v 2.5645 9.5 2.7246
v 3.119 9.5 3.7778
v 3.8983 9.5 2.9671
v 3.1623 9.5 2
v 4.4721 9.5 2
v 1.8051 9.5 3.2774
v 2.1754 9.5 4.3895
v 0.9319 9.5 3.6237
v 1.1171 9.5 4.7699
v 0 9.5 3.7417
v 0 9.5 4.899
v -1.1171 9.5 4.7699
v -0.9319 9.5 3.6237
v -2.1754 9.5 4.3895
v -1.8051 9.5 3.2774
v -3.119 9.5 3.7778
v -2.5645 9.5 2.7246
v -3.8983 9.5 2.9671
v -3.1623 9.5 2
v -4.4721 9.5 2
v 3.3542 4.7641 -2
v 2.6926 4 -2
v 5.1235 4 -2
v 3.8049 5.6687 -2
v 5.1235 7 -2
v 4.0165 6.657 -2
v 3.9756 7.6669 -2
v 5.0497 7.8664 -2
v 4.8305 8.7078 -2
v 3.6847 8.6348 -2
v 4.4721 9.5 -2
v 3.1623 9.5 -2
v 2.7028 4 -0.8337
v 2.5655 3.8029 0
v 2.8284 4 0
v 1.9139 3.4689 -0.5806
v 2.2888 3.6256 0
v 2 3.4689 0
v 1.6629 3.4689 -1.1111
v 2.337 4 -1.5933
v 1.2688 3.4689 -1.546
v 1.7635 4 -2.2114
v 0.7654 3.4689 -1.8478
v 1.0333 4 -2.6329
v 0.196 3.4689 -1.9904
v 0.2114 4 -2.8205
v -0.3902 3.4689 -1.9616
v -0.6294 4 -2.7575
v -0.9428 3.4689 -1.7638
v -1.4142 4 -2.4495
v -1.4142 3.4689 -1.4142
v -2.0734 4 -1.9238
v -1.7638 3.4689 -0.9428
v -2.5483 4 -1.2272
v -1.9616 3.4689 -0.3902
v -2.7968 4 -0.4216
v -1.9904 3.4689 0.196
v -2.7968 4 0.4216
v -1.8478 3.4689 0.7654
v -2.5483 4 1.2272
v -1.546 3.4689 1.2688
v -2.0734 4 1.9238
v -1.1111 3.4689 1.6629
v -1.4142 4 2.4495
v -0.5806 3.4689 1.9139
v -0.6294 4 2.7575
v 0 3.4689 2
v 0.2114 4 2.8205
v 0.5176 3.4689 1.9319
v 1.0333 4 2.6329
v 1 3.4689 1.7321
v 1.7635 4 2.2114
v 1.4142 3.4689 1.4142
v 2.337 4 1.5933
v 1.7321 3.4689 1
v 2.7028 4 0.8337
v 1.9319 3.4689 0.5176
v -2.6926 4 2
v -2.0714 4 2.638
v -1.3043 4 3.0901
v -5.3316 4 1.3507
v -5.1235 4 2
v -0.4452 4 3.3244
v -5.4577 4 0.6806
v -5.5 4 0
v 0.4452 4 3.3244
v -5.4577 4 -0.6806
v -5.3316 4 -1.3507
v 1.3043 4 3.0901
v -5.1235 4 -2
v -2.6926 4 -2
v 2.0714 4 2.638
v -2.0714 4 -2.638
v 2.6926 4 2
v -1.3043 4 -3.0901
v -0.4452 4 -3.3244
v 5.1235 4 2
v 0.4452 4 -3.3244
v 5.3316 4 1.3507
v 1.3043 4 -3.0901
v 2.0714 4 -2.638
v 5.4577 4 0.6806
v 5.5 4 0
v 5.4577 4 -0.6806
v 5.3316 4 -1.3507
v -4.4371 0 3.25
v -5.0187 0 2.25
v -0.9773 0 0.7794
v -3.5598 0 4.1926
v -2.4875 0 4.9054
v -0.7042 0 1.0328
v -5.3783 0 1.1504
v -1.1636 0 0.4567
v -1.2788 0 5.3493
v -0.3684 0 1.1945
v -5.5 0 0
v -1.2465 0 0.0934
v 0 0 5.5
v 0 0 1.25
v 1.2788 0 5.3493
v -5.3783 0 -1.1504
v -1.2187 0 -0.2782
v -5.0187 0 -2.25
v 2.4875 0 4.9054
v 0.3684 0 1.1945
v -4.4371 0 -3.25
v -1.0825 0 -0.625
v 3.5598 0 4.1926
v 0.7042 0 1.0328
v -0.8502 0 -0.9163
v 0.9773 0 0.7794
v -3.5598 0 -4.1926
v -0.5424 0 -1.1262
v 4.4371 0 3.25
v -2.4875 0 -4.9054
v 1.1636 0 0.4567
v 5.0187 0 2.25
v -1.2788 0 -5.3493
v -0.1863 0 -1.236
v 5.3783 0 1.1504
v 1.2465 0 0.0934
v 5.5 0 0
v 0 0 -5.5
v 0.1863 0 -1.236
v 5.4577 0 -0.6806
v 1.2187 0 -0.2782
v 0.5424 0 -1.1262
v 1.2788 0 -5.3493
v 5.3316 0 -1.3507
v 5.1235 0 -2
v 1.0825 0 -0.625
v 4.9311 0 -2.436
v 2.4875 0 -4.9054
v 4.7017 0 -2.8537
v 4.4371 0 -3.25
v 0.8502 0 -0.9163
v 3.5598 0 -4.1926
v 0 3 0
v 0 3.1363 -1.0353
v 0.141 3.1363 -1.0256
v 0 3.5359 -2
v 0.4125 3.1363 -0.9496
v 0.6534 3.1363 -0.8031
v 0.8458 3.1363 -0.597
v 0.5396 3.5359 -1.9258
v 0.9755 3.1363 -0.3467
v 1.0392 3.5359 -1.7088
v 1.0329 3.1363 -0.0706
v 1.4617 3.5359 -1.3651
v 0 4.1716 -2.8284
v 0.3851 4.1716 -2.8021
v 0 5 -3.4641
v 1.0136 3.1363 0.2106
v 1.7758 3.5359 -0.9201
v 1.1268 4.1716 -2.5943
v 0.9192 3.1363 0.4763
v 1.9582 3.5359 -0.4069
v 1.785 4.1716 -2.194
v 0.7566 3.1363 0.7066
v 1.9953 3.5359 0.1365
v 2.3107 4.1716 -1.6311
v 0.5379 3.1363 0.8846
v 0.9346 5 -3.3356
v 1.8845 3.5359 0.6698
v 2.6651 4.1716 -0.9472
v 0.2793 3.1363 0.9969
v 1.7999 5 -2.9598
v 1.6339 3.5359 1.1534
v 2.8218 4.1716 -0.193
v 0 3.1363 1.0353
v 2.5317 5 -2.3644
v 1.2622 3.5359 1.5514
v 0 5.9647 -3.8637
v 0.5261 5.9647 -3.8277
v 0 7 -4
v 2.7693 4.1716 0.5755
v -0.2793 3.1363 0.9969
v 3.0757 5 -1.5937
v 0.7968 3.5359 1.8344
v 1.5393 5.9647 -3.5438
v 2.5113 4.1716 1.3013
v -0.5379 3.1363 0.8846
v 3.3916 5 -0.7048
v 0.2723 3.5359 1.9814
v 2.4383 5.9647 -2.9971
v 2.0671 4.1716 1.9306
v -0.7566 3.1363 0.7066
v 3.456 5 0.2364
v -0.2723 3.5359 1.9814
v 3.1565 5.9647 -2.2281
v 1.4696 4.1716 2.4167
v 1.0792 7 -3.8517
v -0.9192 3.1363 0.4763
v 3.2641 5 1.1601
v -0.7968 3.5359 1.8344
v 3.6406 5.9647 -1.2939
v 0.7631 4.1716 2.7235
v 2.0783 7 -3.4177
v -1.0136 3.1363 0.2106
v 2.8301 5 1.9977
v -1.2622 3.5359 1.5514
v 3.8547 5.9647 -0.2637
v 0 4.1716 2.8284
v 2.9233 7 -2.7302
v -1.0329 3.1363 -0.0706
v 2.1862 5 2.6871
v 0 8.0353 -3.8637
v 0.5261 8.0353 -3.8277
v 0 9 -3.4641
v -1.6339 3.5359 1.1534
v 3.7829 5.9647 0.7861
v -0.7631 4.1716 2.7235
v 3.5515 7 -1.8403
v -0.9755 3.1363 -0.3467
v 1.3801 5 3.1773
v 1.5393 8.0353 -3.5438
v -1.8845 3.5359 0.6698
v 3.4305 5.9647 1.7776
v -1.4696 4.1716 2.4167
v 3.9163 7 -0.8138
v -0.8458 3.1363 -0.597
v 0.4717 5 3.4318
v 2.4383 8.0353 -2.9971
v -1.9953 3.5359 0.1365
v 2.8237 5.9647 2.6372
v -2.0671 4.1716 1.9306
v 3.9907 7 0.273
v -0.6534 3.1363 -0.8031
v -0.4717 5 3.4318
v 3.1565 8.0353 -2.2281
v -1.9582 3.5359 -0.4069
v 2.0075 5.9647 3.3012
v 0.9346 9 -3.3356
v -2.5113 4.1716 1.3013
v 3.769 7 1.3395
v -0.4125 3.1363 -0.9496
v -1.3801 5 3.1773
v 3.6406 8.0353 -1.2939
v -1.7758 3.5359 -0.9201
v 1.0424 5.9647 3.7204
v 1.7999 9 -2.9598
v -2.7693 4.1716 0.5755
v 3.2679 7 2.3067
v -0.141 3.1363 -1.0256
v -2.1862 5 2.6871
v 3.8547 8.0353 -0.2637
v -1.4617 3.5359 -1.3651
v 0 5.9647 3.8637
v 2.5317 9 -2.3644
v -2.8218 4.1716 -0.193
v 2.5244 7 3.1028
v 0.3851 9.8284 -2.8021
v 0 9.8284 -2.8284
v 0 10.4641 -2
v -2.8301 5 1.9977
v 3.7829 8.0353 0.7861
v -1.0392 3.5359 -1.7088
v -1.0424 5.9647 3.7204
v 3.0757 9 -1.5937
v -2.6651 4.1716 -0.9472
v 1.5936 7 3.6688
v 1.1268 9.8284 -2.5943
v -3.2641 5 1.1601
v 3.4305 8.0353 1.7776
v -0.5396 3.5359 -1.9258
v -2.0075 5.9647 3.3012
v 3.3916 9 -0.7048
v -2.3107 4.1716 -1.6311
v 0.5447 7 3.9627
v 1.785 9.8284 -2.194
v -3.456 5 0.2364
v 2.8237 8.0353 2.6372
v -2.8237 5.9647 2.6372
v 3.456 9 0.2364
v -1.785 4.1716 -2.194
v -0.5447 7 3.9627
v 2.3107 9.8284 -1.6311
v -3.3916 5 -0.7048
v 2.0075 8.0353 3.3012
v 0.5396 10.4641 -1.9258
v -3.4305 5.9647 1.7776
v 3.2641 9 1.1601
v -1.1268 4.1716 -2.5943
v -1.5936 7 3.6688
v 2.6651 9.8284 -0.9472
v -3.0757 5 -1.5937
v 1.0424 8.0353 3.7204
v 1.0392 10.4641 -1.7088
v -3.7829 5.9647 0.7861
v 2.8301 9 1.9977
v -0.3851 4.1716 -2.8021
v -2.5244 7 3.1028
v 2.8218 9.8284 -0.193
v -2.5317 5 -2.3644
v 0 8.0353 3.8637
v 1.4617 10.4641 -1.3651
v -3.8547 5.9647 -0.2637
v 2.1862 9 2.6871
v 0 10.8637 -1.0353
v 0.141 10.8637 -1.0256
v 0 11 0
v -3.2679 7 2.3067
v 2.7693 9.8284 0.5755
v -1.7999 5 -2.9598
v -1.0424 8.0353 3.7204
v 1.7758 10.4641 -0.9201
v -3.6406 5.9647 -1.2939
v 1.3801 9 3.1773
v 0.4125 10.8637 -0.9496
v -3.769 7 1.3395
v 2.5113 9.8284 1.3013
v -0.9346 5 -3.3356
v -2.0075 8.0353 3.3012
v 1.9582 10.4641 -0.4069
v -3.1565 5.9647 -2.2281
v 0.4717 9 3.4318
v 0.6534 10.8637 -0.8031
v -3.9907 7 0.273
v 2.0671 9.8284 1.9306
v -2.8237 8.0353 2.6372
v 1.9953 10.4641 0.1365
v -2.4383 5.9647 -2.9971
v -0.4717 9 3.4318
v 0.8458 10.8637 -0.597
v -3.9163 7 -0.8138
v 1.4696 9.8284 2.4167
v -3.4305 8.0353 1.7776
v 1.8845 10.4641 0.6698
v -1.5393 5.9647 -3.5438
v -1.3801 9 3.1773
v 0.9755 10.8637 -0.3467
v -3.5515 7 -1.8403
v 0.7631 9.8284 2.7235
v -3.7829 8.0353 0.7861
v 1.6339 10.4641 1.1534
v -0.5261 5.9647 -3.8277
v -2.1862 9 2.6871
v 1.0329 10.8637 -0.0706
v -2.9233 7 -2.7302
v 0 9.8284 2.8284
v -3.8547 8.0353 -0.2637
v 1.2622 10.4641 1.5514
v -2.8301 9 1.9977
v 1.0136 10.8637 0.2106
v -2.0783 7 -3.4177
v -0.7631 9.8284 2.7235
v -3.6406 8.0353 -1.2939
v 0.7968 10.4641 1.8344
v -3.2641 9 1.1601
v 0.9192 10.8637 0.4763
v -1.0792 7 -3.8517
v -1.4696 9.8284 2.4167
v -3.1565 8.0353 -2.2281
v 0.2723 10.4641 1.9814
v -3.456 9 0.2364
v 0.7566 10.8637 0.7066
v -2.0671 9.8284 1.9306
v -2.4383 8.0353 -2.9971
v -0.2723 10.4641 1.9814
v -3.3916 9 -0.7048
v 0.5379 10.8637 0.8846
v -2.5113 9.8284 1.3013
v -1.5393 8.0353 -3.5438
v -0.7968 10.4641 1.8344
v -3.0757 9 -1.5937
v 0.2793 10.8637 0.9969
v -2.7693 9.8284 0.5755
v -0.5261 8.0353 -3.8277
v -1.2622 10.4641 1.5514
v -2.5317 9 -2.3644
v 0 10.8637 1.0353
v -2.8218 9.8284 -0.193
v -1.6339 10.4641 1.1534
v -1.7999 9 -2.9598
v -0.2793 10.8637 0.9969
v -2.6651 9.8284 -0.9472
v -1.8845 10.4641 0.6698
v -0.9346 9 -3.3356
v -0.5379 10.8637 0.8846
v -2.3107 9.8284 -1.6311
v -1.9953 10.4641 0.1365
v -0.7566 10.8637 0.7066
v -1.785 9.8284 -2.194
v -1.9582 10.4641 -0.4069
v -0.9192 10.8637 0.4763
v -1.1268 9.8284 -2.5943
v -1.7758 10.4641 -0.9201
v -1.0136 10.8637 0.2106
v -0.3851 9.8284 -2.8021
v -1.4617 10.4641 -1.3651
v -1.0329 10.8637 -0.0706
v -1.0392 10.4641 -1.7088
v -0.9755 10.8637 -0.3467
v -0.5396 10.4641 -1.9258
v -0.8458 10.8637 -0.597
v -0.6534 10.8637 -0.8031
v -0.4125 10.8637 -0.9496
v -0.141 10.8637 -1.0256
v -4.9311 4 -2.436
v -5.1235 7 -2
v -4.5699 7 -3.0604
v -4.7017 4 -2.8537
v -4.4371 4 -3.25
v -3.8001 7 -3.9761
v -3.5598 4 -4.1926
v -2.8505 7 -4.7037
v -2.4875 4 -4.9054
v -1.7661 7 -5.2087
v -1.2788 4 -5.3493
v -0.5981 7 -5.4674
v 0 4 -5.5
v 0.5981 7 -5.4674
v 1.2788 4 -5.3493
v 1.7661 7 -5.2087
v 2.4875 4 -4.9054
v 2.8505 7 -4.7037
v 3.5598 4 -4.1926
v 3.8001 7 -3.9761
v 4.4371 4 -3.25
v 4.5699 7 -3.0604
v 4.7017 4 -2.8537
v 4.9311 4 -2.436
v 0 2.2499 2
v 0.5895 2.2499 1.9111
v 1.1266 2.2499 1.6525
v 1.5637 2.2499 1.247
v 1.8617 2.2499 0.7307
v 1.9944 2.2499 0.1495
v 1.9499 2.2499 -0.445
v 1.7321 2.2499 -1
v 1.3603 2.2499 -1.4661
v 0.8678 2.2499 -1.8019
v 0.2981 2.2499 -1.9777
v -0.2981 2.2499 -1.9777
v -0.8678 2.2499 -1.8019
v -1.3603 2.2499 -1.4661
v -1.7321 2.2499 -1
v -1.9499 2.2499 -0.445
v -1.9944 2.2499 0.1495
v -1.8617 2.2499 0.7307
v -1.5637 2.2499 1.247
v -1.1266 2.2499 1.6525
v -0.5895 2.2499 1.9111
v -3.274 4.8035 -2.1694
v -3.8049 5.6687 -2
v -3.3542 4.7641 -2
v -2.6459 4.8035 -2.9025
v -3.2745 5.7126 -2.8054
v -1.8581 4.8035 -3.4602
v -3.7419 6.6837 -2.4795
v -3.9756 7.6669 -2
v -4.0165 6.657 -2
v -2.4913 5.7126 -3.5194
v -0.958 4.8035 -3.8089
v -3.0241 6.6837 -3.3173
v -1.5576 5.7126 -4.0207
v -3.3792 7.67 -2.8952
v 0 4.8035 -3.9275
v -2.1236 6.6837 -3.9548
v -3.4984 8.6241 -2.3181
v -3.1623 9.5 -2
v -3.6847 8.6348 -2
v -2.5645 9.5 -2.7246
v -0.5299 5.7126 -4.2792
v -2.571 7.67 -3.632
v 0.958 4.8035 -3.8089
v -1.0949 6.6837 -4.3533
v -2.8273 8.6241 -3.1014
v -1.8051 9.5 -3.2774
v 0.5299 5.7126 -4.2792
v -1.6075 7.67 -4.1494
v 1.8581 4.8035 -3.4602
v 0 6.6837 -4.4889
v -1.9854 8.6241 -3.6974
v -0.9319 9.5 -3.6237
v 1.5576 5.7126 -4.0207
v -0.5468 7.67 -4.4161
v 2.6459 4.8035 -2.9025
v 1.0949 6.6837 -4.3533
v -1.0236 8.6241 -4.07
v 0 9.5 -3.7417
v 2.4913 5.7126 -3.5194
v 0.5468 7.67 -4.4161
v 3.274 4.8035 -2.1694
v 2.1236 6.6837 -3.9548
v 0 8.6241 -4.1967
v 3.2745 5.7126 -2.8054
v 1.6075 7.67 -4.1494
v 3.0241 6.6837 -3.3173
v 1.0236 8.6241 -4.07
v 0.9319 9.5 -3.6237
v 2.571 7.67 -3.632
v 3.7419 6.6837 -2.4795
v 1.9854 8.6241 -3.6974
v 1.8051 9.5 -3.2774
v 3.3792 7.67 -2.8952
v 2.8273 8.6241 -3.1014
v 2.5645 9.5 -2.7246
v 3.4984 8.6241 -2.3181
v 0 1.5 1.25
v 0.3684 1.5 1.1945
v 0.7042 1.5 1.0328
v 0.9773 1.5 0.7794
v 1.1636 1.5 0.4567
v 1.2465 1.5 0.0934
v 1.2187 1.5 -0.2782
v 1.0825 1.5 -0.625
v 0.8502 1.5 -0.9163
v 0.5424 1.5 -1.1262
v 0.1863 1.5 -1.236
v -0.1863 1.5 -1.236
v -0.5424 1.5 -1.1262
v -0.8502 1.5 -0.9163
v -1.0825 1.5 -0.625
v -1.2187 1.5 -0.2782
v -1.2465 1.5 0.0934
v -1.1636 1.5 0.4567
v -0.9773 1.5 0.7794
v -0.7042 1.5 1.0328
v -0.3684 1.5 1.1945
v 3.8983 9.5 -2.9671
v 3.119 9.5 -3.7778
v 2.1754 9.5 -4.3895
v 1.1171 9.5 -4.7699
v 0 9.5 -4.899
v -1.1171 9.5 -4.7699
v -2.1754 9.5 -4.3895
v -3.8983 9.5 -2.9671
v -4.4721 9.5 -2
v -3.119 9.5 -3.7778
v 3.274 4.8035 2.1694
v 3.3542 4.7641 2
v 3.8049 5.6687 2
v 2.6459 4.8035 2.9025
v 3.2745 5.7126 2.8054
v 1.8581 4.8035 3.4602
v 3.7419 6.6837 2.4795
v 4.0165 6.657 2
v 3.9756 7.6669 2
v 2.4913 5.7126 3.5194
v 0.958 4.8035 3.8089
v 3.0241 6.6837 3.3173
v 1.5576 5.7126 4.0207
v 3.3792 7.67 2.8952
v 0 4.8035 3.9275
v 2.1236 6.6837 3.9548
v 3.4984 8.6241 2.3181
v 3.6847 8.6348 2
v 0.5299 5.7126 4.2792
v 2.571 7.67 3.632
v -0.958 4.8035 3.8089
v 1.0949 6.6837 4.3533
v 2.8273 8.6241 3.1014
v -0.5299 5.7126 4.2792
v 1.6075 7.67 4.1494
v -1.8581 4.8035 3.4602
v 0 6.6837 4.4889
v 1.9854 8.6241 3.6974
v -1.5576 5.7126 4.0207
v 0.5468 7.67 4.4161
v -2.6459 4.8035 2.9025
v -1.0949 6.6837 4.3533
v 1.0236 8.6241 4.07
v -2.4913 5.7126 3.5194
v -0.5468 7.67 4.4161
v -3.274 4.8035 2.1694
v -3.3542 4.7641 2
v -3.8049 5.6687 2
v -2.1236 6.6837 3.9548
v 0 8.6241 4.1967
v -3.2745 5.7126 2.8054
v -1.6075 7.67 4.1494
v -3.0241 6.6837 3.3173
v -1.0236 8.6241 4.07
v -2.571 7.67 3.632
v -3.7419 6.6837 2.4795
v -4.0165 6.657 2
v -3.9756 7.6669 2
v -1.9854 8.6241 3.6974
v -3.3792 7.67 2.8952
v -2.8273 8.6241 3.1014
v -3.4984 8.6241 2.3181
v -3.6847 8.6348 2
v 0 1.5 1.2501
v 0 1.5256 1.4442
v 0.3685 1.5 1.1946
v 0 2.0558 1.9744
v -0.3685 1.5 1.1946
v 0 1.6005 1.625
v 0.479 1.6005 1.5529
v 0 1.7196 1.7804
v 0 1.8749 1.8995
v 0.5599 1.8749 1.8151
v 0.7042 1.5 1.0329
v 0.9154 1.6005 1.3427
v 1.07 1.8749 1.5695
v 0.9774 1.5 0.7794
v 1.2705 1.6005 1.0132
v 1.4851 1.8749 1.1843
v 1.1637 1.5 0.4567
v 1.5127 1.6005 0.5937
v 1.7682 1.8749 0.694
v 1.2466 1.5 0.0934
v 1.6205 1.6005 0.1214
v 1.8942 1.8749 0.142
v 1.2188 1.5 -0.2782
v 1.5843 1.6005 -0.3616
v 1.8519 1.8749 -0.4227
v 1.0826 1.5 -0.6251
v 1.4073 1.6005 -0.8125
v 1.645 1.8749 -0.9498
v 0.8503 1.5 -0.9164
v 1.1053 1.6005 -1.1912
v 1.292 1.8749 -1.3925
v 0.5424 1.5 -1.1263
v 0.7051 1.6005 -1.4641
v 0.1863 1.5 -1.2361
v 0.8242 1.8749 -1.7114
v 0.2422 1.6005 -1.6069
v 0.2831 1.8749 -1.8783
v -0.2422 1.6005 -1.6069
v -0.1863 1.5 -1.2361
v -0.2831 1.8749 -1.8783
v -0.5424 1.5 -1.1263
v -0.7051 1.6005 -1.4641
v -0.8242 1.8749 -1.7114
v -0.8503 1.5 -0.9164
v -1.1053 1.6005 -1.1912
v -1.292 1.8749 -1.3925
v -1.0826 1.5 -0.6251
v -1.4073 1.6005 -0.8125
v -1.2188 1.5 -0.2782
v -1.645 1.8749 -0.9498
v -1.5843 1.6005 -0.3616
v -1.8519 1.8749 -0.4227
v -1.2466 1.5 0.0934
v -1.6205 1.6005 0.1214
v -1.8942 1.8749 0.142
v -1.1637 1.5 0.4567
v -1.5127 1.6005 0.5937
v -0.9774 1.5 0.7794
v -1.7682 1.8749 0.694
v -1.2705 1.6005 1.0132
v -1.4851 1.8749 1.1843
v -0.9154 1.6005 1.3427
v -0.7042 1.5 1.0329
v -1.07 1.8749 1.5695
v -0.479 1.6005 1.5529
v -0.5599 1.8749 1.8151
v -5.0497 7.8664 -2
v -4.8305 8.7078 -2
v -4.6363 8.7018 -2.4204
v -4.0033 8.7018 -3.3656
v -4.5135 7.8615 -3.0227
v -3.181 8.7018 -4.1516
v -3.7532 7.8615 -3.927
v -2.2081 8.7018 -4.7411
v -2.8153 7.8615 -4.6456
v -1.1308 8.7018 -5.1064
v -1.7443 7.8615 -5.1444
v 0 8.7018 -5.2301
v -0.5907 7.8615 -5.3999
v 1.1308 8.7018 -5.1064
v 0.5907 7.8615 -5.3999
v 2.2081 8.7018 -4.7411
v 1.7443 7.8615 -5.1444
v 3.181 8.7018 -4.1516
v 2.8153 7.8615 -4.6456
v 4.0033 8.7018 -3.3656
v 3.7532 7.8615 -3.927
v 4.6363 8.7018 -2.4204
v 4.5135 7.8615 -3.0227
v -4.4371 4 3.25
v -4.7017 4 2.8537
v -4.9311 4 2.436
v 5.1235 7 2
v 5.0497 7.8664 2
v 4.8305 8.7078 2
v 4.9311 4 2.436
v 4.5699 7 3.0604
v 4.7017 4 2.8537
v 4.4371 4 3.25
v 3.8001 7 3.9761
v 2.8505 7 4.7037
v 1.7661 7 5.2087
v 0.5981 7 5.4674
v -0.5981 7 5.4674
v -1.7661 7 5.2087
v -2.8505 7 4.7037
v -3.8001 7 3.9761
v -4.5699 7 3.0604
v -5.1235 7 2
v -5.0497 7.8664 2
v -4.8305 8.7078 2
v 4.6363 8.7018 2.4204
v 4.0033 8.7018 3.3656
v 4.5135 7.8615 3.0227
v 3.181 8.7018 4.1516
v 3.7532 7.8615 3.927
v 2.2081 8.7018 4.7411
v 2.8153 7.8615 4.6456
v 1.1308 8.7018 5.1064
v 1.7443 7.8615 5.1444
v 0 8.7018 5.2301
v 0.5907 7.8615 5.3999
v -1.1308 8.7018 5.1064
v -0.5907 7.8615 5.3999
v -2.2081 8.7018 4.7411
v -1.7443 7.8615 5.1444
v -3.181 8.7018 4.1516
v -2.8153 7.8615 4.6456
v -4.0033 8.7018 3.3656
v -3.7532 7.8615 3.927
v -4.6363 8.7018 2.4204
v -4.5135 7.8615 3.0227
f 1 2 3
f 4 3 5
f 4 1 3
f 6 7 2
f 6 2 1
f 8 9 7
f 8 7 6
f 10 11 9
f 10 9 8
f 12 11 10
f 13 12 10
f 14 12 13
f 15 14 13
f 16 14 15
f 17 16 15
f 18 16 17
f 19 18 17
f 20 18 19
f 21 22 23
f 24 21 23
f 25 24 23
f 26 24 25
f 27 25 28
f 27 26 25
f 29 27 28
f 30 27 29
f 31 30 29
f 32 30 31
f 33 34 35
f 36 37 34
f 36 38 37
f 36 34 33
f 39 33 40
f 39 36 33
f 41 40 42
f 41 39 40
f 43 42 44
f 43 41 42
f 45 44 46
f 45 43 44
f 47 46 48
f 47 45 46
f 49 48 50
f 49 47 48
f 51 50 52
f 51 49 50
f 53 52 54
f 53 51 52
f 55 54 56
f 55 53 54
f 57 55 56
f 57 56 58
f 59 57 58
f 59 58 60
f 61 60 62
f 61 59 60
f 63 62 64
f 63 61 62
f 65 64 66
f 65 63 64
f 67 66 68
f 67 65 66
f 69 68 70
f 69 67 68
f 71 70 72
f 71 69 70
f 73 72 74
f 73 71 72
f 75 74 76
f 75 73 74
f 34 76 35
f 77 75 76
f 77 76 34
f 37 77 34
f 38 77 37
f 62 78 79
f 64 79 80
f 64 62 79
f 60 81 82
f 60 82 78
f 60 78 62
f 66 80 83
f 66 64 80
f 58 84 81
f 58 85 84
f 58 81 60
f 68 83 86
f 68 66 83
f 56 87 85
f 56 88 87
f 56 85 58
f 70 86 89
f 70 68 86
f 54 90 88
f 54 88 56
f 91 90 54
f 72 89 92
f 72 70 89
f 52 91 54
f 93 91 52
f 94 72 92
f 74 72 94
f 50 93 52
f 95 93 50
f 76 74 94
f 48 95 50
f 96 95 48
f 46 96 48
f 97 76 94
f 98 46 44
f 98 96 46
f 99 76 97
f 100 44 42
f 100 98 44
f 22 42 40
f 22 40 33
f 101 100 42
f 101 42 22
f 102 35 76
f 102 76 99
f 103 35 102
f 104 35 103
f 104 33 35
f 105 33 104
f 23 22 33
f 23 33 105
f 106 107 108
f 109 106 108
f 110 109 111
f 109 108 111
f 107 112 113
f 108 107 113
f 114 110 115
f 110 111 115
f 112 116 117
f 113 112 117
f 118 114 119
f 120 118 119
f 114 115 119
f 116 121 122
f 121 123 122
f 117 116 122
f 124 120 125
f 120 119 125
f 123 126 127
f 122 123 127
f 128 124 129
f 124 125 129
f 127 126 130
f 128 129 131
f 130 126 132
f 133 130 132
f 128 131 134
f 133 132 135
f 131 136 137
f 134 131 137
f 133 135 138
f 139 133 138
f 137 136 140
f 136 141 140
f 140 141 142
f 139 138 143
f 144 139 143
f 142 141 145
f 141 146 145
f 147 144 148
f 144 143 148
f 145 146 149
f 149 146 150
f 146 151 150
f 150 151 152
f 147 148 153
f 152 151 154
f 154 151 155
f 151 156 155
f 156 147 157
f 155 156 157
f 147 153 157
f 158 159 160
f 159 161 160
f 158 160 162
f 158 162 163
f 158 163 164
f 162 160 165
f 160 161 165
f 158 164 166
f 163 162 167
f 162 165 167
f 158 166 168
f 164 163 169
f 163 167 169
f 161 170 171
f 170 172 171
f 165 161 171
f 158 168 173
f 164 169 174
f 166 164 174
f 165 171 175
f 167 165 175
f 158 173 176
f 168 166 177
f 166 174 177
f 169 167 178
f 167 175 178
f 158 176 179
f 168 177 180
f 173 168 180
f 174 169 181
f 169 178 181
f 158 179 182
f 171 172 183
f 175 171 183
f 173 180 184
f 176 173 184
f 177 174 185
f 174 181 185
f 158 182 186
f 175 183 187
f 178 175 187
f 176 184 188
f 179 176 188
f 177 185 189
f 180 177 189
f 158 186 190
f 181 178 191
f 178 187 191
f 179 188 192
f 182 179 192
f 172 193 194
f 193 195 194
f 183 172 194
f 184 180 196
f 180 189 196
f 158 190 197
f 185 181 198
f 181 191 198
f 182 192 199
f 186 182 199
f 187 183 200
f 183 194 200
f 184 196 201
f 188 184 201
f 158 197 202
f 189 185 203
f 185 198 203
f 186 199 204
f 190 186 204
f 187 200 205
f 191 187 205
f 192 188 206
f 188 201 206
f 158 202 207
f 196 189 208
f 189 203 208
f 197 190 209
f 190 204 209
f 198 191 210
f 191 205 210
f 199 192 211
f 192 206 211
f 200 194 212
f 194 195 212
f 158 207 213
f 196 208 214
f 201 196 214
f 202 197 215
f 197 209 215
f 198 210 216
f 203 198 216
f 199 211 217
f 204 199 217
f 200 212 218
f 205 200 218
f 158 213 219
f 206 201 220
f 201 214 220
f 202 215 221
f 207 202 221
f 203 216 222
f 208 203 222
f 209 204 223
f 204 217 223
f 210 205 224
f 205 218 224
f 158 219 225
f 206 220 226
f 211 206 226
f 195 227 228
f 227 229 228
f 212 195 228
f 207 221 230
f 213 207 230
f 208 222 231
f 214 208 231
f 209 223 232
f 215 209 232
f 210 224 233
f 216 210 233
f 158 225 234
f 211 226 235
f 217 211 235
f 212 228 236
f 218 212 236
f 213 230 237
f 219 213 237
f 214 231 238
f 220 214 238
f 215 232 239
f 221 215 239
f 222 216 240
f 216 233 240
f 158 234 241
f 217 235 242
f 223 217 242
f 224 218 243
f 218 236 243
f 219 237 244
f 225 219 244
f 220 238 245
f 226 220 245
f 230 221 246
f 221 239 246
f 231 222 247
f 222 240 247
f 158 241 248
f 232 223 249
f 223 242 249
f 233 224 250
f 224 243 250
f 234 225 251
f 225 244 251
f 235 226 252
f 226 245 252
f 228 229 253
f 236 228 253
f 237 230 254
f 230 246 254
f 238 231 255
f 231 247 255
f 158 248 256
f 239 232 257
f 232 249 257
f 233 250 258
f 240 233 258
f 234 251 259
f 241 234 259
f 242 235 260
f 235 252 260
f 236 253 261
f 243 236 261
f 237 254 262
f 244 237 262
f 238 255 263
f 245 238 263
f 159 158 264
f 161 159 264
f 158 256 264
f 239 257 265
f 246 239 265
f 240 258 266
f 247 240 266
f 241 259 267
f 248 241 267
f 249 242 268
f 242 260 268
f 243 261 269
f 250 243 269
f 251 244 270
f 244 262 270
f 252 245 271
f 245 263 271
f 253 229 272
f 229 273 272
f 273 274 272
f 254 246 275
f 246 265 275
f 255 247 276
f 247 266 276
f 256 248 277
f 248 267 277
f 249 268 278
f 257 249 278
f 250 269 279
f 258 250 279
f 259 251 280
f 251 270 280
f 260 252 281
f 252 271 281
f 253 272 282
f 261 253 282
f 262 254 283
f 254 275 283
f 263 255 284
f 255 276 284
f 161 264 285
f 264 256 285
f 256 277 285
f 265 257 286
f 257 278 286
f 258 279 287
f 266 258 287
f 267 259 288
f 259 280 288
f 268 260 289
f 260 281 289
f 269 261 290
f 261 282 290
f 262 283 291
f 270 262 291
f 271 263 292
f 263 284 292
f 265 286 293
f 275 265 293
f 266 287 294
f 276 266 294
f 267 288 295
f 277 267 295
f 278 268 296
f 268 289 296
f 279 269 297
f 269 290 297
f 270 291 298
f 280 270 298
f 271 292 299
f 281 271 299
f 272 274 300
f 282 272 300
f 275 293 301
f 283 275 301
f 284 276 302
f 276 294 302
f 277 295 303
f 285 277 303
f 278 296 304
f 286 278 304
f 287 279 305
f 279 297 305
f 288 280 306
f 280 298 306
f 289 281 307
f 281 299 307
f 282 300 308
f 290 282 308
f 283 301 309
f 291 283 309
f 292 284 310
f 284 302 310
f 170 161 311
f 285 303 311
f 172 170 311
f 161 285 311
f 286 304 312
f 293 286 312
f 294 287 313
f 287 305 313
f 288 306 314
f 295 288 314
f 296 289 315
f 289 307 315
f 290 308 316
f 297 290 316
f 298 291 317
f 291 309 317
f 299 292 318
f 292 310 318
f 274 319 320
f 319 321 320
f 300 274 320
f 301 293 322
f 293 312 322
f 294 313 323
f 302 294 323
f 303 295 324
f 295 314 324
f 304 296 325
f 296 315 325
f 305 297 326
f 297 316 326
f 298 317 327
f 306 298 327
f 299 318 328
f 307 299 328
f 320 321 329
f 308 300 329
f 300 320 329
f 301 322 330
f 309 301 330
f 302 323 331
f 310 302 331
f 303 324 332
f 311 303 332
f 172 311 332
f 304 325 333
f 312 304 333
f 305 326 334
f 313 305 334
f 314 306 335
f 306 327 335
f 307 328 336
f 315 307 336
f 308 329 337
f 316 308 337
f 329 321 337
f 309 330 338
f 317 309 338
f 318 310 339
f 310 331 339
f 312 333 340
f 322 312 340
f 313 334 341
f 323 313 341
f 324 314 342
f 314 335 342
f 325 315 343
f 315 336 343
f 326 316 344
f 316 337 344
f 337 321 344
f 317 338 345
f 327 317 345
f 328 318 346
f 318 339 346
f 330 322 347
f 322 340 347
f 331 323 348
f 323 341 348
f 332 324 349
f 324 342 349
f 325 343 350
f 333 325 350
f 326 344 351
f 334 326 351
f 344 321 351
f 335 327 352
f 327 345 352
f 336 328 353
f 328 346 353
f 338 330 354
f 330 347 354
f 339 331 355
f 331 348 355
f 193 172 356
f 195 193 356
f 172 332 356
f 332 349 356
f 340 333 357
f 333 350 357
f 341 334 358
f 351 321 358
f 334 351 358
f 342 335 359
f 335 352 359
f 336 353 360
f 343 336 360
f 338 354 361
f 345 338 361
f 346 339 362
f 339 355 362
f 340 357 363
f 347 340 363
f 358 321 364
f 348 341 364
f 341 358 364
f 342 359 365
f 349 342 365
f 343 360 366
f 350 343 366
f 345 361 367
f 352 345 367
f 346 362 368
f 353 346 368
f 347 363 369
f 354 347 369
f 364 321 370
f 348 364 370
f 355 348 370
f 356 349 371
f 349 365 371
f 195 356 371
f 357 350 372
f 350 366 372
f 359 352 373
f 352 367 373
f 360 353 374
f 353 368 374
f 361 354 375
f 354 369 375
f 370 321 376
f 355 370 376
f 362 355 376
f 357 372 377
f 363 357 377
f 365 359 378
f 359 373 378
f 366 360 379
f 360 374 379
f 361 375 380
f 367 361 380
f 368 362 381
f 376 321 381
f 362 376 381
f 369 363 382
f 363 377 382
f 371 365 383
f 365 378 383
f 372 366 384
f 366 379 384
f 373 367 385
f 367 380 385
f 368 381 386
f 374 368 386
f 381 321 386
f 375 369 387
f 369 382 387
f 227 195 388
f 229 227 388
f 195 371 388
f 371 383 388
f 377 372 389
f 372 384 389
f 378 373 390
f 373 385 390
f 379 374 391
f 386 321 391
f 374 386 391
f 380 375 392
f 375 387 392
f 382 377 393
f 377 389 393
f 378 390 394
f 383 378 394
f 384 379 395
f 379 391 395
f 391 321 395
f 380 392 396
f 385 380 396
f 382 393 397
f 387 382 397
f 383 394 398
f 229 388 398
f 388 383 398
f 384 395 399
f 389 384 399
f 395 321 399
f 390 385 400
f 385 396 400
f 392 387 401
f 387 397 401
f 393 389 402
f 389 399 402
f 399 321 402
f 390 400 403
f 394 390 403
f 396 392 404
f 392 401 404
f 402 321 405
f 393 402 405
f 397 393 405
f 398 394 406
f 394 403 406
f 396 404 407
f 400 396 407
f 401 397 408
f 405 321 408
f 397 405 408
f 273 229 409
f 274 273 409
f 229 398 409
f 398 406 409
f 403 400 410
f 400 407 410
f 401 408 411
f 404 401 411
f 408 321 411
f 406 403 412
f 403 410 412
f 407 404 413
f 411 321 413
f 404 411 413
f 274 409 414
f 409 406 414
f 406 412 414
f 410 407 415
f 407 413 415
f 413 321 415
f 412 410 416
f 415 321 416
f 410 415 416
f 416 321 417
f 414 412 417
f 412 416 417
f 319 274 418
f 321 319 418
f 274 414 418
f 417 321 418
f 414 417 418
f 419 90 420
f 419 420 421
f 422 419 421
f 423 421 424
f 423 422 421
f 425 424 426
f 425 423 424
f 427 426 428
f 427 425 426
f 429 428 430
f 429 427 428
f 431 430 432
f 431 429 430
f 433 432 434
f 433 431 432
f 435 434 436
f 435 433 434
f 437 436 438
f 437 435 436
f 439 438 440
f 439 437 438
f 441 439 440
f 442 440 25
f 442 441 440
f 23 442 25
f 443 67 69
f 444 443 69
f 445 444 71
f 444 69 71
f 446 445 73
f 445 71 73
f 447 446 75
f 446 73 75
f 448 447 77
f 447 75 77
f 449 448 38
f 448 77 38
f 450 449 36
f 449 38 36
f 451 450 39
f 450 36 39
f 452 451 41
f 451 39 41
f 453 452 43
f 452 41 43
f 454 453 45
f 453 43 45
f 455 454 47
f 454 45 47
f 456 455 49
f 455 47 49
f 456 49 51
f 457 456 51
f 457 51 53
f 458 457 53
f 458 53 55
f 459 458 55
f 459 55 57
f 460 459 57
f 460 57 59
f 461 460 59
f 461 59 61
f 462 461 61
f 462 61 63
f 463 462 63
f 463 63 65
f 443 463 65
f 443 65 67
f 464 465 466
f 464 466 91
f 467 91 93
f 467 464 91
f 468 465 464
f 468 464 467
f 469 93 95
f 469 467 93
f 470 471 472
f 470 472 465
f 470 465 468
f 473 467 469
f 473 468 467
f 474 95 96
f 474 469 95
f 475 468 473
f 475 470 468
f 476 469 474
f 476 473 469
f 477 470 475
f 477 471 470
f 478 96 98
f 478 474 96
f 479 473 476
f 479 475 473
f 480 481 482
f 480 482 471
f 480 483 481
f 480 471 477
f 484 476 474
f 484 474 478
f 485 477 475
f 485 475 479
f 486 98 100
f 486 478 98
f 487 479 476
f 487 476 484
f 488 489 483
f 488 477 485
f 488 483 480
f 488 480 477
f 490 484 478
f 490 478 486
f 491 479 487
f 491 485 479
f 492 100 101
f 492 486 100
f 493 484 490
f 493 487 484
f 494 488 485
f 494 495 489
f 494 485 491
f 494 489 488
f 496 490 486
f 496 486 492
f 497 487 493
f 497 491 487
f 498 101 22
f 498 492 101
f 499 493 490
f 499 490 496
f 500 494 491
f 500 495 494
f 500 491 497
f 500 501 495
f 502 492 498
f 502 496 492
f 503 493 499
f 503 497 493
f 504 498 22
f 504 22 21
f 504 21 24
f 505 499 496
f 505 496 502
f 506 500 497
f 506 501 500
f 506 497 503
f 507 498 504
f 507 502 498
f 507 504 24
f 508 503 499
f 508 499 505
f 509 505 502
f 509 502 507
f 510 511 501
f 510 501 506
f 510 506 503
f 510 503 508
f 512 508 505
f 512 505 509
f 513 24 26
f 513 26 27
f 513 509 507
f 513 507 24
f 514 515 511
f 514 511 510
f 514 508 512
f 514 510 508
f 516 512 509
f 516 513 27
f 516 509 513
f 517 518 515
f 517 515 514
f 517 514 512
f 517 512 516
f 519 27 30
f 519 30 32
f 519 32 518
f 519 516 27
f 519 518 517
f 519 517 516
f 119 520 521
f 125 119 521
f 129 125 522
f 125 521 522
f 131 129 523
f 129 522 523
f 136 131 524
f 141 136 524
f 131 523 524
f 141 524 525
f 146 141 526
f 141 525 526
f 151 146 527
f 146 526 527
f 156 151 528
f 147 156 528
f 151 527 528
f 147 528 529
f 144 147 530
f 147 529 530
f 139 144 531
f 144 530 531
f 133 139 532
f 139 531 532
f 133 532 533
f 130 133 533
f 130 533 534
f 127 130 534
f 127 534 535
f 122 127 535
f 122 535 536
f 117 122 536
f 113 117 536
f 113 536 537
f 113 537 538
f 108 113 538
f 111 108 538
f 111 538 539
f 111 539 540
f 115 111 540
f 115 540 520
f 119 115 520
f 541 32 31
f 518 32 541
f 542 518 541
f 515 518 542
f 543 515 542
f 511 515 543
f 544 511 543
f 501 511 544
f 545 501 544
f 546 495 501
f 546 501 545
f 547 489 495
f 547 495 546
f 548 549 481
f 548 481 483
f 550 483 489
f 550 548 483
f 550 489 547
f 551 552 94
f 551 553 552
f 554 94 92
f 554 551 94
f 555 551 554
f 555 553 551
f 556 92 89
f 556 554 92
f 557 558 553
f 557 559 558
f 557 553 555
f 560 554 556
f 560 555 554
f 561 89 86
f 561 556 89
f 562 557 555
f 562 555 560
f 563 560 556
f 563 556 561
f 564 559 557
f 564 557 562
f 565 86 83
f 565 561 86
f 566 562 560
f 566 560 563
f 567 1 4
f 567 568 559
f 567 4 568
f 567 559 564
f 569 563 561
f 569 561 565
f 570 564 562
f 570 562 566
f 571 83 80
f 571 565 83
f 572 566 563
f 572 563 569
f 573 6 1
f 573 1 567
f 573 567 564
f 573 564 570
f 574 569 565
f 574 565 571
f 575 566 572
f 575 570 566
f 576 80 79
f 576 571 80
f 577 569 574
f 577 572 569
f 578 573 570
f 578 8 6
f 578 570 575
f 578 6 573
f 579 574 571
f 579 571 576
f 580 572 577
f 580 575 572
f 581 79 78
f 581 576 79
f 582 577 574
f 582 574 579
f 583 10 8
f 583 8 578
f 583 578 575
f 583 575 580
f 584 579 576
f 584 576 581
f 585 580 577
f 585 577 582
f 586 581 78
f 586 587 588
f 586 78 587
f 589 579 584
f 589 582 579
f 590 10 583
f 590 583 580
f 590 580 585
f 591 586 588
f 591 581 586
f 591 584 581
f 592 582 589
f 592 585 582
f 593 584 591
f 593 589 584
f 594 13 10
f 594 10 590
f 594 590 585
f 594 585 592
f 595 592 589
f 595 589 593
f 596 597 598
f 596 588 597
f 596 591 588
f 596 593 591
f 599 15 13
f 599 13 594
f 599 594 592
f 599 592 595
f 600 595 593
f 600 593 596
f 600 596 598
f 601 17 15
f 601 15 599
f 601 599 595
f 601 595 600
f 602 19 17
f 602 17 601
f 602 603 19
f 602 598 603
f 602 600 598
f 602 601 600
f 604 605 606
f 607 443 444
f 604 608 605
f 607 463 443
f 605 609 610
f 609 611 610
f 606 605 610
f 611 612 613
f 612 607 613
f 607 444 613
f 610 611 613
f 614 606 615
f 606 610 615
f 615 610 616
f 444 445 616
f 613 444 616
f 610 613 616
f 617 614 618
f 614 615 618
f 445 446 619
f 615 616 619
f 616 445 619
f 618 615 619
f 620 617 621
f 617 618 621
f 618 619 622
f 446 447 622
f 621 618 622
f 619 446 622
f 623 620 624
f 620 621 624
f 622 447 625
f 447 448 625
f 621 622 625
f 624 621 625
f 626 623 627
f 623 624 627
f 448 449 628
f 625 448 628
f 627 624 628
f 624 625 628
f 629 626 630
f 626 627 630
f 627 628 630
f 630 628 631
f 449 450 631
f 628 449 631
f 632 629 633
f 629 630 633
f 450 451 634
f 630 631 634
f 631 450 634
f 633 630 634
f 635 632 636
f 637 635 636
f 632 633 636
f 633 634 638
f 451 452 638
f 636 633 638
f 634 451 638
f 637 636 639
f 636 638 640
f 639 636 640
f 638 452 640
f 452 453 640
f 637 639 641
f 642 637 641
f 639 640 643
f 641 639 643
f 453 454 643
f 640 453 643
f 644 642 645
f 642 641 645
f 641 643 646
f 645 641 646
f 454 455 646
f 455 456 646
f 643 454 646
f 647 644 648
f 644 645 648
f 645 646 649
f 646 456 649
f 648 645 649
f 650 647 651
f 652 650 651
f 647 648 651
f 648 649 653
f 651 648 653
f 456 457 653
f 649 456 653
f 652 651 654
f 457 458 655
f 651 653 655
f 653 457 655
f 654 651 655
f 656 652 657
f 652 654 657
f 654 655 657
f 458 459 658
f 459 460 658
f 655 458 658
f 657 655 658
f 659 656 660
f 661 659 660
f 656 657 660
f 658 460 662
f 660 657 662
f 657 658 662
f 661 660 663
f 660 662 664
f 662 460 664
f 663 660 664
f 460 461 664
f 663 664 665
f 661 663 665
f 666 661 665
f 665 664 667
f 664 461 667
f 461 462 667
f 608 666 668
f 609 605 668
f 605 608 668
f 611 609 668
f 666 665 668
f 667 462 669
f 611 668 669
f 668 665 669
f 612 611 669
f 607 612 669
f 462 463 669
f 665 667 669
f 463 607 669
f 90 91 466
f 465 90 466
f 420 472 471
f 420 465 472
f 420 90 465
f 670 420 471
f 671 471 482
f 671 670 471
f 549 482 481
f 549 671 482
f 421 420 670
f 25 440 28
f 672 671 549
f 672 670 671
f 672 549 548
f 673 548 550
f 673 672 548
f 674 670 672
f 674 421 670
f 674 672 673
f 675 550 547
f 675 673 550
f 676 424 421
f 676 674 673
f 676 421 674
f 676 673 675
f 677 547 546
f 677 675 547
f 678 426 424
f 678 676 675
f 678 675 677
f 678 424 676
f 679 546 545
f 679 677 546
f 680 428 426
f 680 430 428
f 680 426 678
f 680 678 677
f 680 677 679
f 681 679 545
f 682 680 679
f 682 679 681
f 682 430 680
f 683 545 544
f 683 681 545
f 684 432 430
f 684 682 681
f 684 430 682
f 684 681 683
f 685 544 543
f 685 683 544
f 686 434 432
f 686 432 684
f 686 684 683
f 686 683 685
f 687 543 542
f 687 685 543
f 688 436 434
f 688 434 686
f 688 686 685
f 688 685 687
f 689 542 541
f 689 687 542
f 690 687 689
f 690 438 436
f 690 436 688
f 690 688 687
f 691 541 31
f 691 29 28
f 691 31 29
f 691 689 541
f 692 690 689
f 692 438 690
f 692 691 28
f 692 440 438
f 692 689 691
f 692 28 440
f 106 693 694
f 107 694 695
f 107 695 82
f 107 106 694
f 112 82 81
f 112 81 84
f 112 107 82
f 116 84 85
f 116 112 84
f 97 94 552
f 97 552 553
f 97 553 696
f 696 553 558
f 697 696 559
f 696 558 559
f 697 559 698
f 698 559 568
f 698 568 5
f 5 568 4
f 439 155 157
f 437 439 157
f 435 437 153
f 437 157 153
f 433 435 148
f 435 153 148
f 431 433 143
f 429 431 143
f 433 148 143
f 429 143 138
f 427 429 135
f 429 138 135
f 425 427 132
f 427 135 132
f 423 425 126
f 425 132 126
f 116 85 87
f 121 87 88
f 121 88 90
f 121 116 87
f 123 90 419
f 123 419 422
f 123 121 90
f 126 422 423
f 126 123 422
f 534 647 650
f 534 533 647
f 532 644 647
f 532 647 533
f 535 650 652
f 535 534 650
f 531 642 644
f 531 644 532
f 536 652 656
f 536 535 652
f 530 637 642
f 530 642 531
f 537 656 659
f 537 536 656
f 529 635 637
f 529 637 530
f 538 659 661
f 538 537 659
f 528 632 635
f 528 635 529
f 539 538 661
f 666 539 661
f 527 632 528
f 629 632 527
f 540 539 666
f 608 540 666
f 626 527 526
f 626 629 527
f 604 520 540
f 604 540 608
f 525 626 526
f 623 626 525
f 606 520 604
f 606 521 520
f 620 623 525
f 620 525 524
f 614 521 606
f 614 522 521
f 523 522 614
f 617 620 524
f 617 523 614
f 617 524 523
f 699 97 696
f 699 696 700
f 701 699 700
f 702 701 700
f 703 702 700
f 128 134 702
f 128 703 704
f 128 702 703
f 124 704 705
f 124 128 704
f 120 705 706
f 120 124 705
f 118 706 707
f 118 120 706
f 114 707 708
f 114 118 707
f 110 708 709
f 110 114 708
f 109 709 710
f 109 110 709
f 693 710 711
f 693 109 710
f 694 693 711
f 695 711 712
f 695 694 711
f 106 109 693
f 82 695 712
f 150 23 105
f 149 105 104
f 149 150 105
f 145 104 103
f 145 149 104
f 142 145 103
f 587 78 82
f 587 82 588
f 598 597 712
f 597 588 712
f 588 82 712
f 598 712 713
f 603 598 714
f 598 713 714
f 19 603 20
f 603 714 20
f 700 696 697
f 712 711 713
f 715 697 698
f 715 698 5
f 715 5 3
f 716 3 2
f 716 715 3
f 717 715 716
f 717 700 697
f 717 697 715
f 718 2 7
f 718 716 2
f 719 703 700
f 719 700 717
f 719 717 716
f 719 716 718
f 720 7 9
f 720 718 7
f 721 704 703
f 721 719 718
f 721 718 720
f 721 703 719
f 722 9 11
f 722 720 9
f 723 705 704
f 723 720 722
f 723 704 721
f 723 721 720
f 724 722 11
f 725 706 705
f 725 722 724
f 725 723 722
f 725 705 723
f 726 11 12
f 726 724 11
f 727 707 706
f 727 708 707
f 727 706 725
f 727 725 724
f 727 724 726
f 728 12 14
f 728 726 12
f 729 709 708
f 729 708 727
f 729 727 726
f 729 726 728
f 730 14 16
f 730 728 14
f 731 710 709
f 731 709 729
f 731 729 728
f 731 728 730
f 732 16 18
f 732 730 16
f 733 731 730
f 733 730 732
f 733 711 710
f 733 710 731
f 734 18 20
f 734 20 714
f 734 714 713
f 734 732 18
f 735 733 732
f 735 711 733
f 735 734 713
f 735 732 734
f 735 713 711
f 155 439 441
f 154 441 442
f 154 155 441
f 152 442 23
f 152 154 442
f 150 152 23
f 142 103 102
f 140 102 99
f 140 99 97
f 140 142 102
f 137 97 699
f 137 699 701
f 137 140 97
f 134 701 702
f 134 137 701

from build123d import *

# Parameters (mm, degrees)
SKETCH1_R               = 1
BOSS_EXTRUDE1_DEPTH     = 4
SKETCH22_R              = 2
CUT_EXTRUDE4_DEPTH      = 2.5
SKETCH23_R              = 1.25
CUT_EXTRUDE5_DEPTH      = 11.428326807
FILLET1_R               = 0.75
CUT_EXTRUDE2_DEPTH      = 14.883443377
CUT_EXTRUDE2_DEPTH_BACK = 14.883443377
SKETCH20_W              = 4
SKETCH20_H              = 5.5
SKETCH21_OUTSIDE_W      = 23.608
SKETCH21_OUTSIDE_H      = 17.608
SKETCH21_OUTSIDE_R      = 5.5
CUT_EXTRUDE3_DEPTH      = 15.949916388


with BuildPart() as part:
    # Sketch1 → Boss-Extrude1 (new body)
    with BuildSketch(Plane(origin=(0, 0, 0), x_dir=(1, 0, 0), z_dir=(0, 1, 0))):
        with BuildLine():
            ThreePointArc((-4.437059837, -3.25), (0, -5.5), (4.437059837, -3.25))
            ThreePointArc((4.437059837, -3.25), (5.343838437, -2.419215147), (6.5, -2))
            ThreePointArc((6.5, -2), (8.5, 0), (6.5, 2))
            ThreePointArc((6.5, 2), (5.343838437, 2.419215147), (4.437059837, 3.25))
            ThreePointArc((4.437059837, 3.25), (0, 5.5), (-4.437059837, 3.25))
            ThreePointArc((-4.437059837, 3.25), (-5.343838437, 2.419215147), (-6.5, 2))
            ThreePointArc((-6.5, 2), (-8.5, 0), (-6.5, -2))
            ThreePointArc((-6.5, -2), (-5.343838437, -2.419215147), (-4.437059837, -3.25))
        make_face()
        with Locations(Location((-6.5, 0, 0), (0, 0, 270))):
            Circle(SKETCH1_R, mode=Mode.SUBTRACT)
        with Locations(Location((6.5, 0, 0), (0, 0, 270))):
            Circle(SKETCH1_R, mode=Mode.SUBTRACT)
    extrude(amount=BOSS_EXTRUDE1_DEPTH)

    # Sketch10 → Cut-Revolve2 (revolve, cut)
    with BuildSketch(Plane.XY):
        with BuildLine():
            Line((0, 3), (0, 12))
            ThreePointArc((0, 12), (4.5, 7.5), (0, 3))
        make_face()
    revolve(axis=Axis((0, 3, 0), (0, 1, 0)), mode=Mode.SUBTRACT)

    # Sketch22 → Cut-Extrude4 (cut)
    with BuildSketch(Plane(origin=(0, 4, 0), x_dir=(1, 0, 0), z_dir=(0, 1, 0))):
        with Locations(Location((0, 0, 0), (0, 0, 270))):
            Circle(SKETCH22_R)
    extrude(amount=-CUT_EXTRUDE4_DEPTH, mode=Mode.SUBTRACT)

    # Sketch23 → Cut-Extrude5 (cut, through all)
    with BuildSketch(Plane(origin=(0, 1.5, 0), x_dir=(1, 0, 0), z_dir=(0, 1, 0))):
        with Locations(Location((0, 0, 0), (0, 0, 270))):
            Circle(SKETCH23_R)
    extrude(amount=-CUT_EXTRUDE5_DEPTH, mode=Mode.SUBTRACT)

    # Fillet1
    fillet1_edges = [part.edges().sort_by_distance(p)[0] for p in [
        (0, 1.5, -2),
    ]]
    fillet(fillet1_edges, radius=FILLET1_R - 0.0001)  # a hair under: the kernel refuses the full size

    # Sketch19 → Revolve6 (revolve)
    with BuildSketch(Plane(origin=(0, 0, 0), x_dir=(0, 0, -1), z_dir=(1, 0, 0)), mode=Mode.PRIVATE) as revolve6_sk:
        with BuildLine():
            Line((5.5, 7), (5.5, 4))
            Line((5.5, 4), (3.354101966, 4))
            ThreePointArc((3.354101966, 4), (4.48886959, 6.683693501), (3.741657387, 9.5))
            Line((3.741657387, 9.5), (4.898979486, 9.5))
            ThreePointArc((4.898979486, 9.5), (5.347634392, 8.285615189), (5.5, 7))
        make_face()
    revolve(revolve6_sk.sketch.rotate(Axis((0, 11, 0), (0, -1, 0)), 180), axis=Axis((0, 11, 0), (0, -1, 0)))

    # Sketch20 → Cut-Extrude2 (cut, two sides: drawn at the far end of the back side and taken through both)
    with BuildSketch(Plane(origin=(0, 0, 0), x_dir=(0, 0, -1), z_dir=(1, 0, 0)).offset(-CUT_EXTRUDE2_DEPTH_BACK)):
        with Locations((0, 6.75)):
            Rectangle(SKETCH20_W, SKETCH20_H)
    extrude(amount=CUT_EXTRUDE2_DEPTH + CUT_EXTRUDE2_DEPTH_BACK, mode=Mode.SUBTRACT)

    # Sketch21 outside → Cut-Extrude3 (cut, through all)
    with BuildSketch(Plane.XZ):
        Rectangle(SKETCH21_OUTSIDE_W, SKETCH21_OUTSIDE_H)
        with Locations(Location((0, 0, 0), (0, 0, 338.676313737))):
            Circle(SKETCH21_OUTSIDE_R, mode=Mode.SUBTRACT)
    extrude(amount=-CUT_EXTRUDE3_DEPTH, mode=Mode.SUBTRACT)


with BuildPart() as body_2:
    # Sketch18 → Revolve7 (revolve)
    with BuildSketch(Plane(origin=(0, 0, 0), x_dir=(0, 0, -1), z_dir=(1, 0, 0))):
        with BuildLine():
            Line((0, 11), (0, 3))
            ThreePointArc((0, 3), (4, 7), (0, 11))
        make_face()
    revolve(axis=Axis((0, 11, 0), (0, -1, 0)))


solid = Compound([part.part, body_2.part])
